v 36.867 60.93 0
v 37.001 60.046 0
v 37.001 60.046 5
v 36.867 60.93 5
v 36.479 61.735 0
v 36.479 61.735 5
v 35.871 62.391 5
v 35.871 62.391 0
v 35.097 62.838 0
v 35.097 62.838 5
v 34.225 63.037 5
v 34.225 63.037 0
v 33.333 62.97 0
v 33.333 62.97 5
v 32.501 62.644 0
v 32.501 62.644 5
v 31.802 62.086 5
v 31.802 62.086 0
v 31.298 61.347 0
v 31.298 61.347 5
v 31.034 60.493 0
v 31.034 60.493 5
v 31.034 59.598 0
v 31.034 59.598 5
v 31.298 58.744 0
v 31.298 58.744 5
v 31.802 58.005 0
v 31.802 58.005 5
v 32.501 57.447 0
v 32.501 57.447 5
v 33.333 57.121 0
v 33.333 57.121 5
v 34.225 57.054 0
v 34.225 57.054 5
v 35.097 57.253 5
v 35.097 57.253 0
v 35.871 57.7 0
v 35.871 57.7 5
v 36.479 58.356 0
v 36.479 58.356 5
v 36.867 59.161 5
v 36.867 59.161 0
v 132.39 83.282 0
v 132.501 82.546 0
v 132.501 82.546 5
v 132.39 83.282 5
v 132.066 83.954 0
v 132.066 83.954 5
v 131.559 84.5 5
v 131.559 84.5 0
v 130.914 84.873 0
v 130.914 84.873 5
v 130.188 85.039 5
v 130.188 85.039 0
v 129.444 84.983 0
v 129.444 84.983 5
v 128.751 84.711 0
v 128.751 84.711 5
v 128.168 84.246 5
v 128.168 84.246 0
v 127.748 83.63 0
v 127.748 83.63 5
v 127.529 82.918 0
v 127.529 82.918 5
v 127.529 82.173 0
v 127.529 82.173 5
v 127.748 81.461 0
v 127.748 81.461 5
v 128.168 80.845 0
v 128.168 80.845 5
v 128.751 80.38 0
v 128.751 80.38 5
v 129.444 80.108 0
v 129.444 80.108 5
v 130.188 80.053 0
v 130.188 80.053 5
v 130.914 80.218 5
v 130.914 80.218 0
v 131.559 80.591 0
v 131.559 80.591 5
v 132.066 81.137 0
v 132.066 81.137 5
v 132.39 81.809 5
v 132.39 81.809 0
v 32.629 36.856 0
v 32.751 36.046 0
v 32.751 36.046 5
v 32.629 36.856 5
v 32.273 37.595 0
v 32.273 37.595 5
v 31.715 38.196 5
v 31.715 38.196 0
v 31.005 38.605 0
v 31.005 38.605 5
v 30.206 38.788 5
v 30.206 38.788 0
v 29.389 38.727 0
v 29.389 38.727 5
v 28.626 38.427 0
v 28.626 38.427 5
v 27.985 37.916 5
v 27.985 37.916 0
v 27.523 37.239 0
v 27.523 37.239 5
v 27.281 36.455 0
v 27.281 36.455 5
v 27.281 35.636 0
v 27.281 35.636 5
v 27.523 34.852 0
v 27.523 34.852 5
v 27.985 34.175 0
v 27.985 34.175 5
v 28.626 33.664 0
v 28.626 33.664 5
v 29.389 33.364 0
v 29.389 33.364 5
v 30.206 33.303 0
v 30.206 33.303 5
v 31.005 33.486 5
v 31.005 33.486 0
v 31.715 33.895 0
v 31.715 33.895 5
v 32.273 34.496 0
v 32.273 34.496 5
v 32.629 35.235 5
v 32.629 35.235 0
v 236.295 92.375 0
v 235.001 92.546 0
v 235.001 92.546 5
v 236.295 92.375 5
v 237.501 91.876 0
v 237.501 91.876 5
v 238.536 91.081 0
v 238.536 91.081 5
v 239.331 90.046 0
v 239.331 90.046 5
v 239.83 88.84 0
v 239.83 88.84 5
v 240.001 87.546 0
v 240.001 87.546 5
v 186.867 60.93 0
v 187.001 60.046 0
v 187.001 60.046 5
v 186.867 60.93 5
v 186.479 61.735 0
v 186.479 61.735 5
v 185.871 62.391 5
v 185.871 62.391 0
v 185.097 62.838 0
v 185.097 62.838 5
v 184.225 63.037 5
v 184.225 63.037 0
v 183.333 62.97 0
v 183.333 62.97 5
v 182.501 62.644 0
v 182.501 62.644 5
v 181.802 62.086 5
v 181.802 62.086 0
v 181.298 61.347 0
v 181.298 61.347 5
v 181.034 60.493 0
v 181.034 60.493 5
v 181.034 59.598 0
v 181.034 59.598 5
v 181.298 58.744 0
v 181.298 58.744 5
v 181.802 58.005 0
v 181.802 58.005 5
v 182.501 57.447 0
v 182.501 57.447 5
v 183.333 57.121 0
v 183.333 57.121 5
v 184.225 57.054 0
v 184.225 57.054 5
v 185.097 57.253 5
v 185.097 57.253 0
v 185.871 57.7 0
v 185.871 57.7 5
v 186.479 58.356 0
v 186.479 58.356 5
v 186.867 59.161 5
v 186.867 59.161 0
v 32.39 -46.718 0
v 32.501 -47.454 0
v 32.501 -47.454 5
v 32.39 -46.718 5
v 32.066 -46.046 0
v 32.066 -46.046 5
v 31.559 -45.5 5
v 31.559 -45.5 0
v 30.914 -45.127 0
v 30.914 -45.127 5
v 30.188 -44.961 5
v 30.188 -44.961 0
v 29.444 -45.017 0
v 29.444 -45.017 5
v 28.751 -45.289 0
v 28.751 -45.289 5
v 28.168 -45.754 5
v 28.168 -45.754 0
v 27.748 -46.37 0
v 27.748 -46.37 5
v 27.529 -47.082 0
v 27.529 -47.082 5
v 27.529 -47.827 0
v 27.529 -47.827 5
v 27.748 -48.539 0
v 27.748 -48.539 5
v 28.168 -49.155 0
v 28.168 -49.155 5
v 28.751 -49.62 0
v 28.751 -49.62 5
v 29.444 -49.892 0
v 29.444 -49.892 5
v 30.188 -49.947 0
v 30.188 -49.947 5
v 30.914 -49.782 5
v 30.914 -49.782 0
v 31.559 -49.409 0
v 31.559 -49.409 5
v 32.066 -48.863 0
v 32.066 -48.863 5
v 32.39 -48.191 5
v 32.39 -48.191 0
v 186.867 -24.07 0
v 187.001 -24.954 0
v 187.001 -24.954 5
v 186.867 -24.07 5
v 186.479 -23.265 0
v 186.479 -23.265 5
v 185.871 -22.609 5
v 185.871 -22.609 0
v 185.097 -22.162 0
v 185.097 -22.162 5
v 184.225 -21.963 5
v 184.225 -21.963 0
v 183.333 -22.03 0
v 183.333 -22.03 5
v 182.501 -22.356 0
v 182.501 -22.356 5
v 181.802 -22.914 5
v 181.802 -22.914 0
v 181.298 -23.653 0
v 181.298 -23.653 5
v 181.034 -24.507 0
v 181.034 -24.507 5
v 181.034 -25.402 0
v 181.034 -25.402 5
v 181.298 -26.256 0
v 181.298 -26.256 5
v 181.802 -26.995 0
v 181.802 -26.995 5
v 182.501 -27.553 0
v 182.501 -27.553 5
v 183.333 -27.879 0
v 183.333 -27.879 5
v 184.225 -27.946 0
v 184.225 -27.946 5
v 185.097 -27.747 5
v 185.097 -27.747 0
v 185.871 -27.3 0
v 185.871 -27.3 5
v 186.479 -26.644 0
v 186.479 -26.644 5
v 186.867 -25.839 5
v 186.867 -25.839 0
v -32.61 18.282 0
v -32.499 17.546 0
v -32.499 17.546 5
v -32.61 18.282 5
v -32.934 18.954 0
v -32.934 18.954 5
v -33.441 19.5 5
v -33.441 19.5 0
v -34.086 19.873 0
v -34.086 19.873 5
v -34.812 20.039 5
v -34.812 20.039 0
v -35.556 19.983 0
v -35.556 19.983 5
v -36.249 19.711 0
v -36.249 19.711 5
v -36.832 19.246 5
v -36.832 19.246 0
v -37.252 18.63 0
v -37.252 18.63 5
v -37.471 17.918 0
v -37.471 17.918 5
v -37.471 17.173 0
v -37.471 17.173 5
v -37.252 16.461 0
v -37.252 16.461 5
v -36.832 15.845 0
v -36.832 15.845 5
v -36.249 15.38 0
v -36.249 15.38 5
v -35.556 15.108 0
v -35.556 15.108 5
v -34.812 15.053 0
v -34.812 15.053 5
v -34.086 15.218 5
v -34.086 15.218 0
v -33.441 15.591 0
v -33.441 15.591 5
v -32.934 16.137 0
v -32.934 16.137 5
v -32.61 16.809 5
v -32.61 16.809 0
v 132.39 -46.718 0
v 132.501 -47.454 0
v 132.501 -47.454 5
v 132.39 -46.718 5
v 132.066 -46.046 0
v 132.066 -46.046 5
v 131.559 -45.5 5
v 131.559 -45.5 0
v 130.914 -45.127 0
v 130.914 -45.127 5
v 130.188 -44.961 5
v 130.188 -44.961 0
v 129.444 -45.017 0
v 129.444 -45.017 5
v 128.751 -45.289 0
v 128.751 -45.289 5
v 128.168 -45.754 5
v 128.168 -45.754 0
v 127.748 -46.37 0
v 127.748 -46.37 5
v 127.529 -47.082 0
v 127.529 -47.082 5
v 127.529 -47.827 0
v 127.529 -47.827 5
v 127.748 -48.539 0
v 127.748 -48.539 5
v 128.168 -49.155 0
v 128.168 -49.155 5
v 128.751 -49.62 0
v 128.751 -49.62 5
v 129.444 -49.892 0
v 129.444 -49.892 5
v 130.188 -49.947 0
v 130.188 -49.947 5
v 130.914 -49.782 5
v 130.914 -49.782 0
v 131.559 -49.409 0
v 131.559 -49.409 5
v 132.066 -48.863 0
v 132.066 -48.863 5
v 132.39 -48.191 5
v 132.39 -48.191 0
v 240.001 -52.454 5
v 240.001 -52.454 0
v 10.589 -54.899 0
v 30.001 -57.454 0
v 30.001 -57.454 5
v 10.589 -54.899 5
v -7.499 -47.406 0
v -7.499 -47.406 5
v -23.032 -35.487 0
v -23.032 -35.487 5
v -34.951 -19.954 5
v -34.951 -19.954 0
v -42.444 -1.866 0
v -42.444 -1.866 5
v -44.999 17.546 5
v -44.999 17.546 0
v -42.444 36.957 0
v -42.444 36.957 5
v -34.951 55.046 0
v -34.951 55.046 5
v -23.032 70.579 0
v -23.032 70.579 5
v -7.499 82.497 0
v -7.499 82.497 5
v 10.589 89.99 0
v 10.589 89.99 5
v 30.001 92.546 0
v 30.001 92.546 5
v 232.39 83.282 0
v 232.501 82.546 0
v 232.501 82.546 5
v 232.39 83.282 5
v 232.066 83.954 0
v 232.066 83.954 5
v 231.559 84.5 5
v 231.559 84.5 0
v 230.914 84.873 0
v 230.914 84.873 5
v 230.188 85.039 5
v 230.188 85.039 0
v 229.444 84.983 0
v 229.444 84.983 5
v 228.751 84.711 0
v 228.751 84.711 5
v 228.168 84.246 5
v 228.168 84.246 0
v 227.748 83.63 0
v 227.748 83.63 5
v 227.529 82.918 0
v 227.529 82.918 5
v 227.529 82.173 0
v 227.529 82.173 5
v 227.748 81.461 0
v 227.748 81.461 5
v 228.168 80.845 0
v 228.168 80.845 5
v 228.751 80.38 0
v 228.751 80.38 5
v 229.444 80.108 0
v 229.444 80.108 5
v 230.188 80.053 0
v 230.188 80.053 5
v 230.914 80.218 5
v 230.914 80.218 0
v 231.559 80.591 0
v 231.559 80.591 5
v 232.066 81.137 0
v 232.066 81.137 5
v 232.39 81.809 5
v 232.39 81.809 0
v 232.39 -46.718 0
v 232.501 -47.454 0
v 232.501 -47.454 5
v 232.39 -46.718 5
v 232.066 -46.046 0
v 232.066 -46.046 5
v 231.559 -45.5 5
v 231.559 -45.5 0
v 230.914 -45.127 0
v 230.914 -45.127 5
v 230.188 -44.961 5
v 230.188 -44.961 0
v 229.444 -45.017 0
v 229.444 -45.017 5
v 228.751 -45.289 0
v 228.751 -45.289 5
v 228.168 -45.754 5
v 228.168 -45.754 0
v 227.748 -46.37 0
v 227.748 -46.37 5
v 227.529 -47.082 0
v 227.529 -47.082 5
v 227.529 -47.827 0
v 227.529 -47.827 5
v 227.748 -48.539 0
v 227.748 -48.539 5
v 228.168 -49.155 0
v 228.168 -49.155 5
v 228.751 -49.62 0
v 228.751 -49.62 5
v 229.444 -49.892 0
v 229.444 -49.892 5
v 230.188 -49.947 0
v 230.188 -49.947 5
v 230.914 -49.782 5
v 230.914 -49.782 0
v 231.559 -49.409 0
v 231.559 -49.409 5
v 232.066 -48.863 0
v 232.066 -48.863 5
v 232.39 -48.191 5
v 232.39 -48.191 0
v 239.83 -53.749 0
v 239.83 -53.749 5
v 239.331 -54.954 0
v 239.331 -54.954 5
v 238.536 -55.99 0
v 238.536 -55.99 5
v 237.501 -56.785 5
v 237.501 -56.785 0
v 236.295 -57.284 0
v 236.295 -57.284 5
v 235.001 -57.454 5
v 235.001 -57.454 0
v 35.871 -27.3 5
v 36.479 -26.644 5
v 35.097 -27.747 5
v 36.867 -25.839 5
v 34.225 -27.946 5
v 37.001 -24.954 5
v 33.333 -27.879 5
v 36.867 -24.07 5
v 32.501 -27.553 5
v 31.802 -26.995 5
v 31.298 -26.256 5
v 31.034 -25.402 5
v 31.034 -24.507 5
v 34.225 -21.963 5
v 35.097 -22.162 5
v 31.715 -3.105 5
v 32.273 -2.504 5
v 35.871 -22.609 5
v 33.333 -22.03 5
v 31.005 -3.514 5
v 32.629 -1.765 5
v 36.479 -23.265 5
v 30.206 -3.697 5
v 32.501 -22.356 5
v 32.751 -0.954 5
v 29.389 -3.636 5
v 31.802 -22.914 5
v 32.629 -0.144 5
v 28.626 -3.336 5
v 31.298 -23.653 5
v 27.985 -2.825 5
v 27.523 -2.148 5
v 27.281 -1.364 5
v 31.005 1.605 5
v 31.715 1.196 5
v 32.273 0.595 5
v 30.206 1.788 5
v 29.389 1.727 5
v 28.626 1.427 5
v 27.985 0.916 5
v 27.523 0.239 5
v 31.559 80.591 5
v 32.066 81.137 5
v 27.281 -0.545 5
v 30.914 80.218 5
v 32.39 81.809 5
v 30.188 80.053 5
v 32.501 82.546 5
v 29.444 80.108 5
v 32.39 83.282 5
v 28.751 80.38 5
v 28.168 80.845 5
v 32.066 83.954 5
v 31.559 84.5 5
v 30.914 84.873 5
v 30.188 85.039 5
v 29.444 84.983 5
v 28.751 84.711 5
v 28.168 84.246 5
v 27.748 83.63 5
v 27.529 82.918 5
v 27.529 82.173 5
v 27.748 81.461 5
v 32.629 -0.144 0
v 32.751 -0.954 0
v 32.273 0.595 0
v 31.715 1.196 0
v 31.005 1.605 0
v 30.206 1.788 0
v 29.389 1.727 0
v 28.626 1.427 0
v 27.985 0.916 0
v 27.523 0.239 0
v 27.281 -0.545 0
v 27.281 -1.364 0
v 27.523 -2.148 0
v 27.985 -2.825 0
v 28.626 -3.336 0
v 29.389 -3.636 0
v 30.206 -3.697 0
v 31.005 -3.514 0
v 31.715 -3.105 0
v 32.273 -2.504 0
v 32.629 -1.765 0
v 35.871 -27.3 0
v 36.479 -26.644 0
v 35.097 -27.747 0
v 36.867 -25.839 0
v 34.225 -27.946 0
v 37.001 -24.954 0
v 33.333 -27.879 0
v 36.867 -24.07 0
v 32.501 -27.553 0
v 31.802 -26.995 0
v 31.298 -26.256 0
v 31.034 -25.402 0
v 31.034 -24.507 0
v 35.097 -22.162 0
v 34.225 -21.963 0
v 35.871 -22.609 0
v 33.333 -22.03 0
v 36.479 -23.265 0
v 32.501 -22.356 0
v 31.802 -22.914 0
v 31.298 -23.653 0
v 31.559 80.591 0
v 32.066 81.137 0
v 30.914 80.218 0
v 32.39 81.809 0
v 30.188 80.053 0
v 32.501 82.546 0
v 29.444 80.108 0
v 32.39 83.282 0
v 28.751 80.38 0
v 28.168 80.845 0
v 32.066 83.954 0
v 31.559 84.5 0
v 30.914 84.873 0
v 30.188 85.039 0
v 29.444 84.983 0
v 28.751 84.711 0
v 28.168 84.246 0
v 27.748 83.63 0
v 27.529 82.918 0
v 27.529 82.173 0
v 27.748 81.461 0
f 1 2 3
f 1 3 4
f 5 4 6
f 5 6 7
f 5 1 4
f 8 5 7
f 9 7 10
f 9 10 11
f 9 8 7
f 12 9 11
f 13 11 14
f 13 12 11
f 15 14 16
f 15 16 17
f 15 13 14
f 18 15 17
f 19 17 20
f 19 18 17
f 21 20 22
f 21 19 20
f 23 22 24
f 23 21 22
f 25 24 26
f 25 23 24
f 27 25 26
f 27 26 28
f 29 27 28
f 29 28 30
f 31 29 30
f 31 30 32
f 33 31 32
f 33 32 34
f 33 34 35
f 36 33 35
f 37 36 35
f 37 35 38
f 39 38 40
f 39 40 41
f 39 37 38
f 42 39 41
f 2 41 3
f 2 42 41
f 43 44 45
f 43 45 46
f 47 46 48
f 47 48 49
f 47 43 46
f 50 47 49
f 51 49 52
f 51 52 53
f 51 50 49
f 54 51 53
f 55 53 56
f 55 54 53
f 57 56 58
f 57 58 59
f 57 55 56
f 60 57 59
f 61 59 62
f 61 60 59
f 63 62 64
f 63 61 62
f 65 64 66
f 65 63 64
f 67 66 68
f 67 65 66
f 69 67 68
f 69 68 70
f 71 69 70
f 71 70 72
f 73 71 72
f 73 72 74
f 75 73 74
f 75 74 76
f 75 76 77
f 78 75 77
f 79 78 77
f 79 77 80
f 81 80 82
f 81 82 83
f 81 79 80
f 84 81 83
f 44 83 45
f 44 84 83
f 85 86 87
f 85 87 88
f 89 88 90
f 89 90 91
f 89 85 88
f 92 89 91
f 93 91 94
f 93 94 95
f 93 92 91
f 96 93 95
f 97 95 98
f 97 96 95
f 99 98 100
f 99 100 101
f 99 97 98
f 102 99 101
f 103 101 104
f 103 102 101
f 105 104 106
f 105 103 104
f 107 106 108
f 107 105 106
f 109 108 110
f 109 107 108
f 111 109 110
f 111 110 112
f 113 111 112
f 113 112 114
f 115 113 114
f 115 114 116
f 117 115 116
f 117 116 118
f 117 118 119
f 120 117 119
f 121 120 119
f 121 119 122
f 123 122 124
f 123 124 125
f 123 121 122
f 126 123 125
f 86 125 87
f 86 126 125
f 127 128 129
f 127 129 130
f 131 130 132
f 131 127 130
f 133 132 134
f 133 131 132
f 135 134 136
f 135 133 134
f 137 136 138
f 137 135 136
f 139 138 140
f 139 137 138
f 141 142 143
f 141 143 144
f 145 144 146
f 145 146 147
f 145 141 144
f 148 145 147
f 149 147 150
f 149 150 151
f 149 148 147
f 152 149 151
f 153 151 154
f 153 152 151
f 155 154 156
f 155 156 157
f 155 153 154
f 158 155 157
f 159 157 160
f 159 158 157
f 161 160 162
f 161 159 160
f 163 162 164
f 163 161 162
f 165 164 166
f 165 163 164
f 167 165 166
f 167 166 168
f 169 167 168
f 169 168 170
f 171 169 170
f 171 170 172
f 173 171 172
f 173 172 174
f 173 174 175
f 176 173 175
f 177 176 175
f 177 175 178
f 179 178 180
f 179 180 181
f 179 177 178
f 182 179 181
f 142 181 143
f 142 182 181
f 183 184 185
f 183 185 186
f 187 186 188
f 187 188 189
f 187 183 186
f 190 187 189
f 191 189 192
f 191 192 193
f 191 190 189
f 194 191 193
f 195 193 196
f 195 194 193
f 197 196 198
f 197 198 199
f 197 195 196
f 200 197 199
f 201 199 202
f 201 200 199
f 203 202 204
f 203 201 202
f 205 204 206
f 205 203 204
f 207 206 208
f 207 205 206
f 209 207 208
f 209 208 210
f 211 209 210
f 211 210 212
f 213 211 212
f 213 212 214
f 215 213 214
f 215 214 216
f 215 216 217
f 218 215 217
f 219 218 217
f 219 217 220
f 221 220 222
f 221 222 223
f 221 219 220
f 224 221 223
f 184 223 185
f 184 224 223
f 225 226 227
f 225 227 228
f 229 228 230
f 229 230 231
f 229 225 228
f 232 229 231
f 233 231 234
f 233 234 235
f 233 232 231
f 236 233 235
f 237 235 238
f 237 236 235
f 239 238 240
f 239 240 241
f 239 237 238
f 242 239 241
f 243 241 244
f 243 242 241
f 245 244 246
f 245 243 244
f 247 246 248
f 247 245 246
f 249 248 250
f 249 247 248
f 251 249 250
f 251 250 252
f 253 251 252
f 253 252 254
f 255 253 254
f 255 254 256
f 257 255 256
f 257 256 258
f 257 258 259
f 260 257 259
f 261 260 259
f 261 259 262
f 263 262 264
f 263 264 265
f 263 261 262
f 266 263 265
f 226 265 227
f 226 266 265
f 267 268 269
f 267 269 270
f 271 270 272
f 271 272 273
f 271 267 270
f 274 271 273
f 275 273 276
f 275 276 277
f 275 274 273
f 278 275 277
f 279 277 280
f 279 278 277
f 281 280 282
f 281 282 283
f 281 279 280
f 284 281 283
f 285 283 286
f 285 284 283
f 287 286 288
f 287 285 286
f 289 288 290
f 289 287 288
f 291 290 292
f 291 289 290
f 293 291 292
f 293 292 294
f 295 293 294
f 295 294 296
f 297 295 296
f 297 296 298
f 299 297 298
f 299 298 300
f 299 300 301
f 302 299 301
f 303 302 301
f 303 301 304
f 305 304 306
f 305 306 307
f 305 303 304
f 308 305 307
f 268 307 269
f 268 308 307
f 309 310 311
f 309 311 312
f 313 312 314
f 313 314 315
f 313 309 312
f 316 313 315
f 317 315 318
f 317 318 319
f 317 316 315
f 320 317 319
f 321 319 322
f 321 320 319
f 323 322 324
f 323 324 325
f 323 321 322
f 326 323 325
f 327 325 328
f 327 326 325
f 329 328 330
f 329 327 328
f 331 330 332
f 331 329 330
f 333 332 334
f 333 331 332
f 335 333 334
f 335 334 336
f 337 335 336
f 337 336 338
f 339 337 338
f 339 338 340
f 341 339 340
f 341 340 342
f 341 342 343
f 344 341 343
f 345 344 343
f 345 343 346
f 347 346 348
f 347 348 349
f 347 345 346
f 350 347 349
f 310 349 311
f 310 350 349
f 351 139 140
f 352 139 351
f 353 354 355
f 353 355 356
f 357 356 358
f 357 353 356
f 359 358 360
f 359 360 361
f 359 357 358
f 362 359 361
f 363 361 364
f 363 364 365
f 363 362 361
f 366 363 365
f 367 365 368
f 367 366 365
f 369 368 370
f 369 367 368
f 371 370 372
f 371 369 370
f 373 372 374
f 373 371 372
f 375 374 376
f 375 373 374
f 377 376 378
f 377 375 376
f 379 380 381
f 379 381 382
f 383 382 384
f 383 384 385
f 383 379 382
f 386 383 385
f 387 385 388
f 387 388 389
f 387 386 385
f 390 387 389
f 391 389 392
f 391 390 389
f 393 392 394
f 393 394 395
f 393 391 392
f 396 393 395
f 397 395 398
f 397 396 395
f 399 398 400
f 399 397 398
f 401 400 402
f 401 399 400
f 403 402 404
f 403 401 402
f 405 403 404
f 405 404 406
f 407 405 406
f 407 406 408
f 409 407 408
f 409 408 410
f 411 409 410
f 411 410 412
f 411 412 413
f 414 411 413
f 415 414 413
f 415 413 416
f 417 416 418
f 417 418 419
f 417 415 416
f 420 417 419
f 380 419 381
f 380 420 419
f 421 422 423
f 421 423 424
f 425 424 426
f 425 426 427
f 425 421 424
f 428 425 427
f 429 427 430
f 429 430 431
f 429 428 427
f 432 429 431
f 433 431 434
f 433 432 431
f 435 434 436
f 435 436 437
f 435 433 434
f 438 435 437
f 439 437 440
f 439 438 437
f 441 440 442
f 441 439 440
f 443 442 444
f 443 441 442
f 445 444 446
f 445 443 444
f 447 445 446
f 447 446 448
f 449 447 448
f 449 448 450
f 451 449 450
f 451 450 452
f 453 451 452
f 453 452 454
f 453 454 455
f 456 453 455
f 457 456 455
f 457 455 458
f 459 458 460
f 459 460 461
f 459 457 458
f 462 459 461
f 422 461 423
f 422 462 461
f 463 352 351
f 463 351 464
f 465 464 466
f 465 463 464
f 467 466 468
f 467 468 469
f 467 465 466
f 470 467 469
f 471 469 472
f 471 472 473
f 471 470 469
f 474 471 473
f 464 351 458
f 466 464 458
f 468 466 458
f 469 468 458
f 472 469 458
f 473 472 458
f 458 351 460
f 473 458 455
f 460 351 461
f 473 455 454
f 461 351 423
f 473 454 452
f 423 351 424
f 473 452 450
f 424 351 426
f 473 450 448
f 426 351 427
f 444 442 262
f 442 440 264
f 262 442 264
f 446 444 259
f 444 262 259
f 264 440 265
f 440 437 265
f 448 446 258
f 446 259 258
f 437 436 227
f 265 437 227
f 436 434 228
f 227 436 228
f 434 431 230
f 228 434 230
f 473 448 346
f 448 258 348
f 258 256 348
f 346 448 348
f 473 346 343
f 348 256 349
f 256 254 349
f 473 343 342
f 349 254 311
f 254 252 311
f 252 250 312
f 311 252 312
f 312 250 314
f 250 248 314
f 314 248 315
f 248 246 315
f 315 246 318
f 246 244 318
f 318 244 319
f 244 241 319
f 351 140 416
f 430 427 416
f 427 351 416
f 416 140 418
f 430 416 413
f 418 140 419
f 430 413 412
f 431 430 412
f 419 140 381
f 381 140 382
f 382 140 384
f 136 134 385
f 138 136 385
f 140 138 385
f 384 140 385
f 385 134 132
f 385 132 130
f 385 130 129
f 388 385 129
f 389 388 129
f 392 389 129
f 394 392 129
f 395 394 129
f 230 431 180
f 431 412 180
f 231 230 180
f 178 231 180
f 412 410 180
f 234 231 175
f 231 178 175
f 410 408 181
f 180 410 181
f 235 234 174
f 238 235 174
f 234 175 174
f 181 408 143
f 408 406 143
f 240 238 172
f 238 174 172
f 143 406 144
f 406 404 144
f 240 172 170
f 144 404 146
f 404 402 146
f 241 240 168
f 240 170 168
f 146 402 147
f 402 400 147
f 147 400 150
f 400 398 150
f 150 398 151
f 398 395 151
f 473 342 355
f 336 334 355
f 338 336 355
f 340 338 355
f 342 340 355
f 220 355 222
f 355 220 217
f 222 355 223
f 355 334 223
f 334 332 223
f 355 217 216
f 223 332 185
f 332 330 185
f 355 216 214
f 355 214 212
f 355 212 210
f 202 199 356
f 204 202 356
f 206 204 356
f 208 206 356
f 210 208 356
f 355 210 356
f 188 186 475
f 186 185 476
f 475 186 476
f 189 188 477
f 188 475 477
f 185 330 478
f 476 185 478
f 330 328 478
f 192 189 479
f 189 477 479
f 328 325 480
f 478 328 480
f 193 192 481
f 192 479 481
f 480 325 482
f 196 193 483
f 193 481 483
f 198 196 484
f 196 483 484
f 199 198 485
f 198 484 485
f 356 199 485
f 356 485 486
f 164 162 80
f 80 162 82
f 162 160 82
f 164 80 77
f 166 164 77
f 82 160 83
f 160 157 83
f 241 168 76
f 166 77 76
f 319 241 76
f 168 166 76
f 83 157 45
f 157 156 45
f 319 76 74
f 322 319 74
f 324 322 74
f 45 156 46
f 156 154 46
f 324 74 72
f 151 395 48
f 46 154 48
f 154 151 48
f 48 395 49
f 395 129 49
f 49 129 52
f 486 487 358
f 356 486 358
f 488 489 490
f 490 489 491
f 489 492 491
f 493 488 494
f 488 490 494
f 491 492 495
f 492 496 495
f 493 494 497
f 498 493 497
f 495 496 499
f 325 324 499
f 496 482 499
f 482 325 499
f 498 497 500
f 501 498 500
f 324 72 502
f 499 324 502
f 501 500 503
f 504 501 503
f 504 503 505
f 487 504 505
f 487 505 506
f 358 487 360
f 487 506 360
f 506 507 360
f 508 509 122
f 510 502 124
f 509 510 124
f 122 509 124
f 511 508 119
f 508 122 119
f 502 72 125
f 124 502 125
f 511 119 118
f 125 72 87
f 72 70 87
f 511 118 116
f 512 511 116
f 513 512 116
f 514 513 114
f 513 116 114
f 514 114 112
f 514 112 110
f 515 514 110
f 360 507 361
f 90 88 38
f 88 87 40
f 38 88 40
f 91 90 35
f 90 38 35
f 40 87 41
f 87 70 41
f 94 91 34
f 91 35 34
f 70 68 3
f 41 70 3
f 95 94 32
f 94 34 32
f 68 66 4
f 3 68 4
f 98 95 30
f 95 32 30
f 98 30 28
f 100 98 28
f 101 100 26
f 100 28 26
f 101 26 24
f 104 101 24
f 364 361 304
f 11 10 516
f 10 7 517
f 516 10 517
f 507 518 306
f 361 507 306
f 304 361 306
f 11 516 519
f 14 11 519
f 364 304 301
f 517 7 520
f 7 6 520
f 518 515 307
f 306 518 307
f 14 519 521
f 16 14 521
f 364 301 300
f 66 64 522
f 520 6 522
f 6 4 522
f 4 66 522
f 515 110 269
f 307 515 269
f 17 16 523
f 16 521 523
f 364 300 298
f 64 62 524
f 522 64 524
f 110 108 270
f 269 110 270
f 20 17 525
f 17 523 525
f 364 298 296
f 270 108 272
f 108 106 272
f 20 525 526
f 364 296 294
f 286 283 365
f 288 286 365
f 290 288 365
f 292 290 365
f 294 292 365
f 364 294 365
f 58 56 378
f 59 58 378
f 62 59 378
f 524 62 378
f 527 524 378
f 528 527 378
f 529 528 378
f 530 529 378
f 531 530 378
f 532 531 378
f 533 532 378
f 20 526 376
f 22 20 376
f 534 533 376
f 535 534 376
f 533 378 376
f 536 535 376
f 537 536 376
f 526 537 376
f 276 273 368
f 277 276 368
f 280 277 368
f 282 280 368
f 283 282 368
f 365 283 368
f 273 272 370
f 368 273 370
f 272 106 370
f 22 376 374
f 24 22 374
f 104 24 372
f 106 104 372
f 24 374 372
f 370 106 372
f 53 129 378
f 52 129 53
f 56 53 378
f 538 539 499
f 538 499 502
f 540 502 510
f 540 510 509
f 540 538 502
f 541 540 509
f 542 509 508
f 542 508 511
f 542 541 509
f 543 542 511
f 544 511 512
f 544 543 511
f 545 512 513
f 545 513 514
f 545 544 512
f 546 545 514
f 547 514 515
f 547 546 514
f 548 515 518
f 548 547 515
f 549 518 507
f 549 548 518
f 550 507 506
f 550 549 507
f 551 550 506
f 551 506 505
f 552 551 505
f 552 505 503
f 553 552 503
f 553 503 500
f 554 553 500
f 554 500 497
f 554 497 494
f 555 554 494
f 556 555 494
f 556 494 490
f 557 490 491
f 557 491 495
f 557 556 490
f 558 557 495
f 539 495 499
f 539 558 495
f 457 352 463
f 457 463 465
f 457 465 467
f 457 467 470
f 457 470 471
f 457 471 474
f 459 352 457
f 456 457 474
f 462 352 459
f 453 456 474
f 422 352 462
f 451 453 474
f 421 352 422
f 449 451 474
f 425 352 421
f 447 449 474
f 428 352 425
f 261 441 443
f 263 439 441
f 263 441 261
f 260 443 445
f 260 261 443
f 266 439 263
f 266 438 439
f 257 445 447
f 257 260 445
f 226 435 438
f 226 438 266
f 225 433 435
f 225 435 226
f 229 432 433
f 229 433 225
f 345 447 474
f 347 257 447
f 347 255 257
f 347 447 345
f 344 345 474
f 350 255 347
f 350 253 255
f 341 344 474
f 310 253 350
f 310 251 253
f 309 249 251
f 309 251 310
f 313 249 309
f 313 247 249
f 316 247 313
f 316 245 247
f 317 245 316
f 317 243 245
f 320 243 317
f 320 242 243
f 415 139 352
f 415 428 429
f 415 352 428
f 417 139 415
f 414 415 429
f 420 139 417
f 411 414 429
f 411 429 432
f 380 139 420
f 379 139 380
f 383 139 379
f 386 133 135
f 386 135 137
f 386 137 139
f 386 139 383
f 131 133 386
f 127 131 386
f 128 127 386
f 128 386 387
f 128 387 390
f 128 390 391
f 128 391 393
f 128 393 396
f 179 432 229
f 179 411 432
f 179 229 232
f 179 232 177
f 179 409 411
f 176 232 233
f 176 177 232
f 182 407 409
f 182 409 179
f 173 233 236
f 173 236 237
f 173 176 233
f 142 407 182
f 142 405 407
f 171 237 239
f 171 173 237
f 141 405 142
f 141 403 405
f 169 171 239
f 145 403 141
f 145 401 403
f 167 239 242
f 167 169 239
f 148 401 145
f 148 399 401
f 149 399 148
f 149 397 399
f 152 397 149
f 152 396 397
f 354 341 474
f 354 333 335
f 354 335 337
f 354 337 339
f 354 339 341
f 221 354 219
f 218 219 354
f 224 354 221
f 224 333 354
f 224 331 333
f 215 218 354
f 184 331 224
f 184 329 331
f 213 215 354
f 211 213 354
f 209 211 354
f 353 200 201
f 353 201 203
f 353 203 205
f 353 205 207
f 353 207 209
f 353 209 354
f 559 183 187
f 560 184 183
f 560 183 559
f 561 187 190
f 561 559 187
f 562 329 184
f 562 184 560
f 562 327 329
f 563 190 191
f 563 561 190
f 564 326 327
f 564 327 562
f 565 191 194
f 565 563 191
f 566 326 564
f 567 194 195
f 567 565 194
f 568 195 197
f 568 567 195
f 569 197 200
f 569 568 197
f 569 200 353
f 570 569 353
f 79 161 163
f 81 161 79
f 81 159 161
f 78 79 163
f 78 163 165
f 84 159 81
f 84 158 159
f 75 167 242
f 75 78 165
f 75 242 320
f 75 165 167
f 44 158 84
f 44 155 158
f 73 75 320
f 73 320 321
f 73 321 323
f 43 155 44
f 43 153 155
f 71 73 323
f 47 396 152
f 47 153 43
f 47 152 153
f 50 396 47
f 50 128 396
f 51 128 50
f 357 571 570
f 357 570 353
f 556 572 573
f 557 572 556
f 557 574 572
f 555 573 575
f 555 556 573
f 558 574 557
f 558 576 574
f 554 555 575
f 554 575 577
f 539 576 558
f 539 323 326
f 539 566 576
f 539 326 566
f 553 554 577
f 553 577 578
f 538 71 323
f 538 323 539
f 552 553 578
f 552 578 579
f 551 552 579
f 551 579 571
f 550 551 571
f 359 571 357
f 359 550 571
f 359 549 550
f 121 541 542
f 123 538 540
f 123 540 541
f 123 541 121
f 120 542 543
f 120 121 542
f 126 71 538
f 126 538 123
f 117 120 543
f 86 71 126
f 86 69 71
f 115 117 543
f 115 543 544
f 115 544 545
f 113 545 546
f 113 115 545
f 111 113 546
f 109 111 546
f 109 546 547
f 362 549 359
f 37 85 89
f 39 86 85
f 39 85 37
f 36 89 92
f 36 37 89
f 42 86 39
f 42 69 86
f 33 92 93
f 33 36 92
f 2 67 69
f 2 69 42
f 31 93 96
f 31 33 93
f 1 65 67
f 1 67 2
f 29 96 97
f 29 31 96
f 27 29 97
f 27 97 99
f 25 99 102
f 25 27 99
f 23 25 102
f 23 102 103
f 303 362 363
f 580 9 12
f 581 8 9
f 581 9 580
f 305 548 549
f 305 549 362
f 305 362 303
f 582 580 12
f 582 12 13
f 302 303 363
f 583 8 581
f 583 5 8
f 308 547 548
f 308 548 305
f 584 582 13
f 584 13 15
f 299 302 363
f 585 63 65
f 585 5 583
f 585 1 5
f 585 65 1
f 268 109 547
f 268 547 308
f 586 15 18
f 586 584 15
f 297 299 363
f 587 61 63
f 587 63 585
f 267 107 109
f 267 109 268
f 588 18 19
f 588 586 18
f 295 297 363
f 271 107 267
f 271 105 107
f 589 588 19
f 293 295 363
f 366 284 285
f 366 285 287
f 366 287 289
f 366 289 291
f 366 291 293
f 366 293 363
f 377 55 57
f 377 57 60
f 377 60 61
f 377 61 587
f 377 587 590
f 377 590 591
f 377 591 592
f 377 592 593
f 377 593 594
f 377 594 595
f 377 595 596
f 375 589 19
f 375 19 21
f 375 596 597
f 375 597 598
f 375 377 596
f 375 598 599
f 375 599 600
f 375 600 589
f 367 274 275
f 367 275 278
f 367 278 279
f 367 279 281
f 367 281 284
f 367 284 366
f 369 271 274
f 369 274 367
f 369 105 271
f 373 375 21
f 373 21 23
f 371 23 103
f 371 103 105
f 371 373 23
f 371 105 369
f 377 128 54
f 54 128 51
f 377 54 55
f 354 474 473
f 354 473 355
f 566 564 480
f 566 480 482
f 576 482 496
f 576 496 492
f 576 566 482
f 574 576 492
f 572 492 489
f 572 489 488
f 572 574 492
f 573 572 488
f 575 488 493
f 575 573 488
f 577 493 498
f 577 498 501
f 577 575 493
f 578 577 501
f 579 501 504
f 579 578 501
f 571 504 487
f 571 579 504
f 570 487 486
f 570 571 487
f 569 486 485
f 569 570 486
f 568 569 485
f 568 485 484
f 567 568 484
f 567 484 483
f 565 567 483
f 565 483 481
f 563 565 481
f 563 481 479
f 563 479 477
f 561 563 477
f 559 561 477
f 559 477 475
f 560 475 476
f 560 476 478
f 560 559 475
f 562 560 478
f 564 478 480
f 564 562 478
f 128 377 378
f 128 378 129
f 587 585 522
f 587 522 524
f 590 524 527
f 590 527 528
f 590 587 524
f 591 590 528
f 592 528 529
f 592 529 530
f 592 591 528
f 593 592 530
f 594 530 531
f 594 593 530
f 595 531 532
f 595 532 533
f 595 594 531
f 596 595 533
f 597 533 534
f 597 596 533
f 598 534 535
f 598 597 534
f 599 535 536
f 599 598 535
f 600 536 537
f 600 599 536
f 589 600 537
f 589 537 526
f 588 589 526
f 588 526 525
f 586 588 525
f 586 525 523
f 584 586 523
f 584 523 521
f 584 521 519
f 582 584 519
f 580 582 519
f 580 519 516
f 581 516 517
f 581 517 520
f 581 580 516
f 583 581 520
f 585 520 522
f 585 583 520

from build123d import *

# Parameters (mm, degrees)
SKETCH1_R           = 3
SKETCH1_R_2         = 2.5
SKETCH1_R_3         = 2.75
BOSS_EXTRUDE1_DEPTH = 5


with BuildPart() as part:
    # Sketch1 → Boss-Extrude1 (new body)
    with BuildSketch(Plane.XY):
        with BuildLine():
            Line((30.000692042, 92.545526446), (235.000692042, 92.545526446))
            ThreePointArc((235.000692042, 92.545526446), (238.536225947, 91.081060352), (240.000692042, 87.545526446))
            Line((240.000692042, 87.545526446), (240.000692042, -52.454473554))
            ThreePointArc((240.000692042, -52.454473554), (238.536225947, -55.99000746), (235.000692042, -57.454473554))
            Line((235.000692042, -57.454473554), (30.000692042, -57.454473554))
            ThreePointArc((30.000692042, -57.454473554), (-44.999307958, 17.545526446), (30.000692042, 92.545526446))
        make_face()
        with Locations((184.000692042, 60.045526446)):
            Circle(SKETCH1_R, mode=Mode.SUBTRACT)
        with Locations((184.000692042, -24.954473554)):
            Circle(SKETCH1_R, mode=Mode.SUBTRACT)
        with Locations((34.000692042, 60.045526446)):
            Circle(SKETCH1_R, mode=Mode.SUBTRACT)
        with Locations((34.000692042, -24.954473554)):
            Circle(SKETCH1_R, mode=Mode.SUBTRACT)
        with Locations((-34.999307958, 17.545526446)):
            Circle(SKETCH1_R_2, mode=Mode.SUBTRACT)
        with Locations((30.000692042, 36.045526446)):
            Circle(SKETCH1_R_3, mode=Mode.SUBTRACT)
        with Locations((30.000692042, -0.954473554)):
            Circle(SKETCH1_R_3, mode=Mode.SUBTRACT)
        with Locations((30.000692042, -47.454473554)):
            Circle(SKETCH1_R_2, mode=Mode.SUBTRACT)
        with Locations((30.000692042, 82.545526446)):
            Circle(SKETCH1_R_2, mode=Mode.SUBTRACT)
        with Locations((230.000692042, -47.454473554)):
            Circle(SKETCH1_R_2, mode=Mode.SUBTRACT)
        with Locations((230.000692042, 82.545526446)):
            Circle(SKETCH1_R_2, mode=Mode.SUBTRACT)
        with Locations((130.000692042, 82.545526446)):
            Circle(SKETCH1_R_2, mode=Mode.SUBTRACT)
        with Locations((130.000692042, -47.454473554)):
            Circle(SKETCH1_R_2, mode=Mode.SUBTRACT)
    extrude(amount=BOSS_EXTRUDE1_DEPTH)


solid = part.part
